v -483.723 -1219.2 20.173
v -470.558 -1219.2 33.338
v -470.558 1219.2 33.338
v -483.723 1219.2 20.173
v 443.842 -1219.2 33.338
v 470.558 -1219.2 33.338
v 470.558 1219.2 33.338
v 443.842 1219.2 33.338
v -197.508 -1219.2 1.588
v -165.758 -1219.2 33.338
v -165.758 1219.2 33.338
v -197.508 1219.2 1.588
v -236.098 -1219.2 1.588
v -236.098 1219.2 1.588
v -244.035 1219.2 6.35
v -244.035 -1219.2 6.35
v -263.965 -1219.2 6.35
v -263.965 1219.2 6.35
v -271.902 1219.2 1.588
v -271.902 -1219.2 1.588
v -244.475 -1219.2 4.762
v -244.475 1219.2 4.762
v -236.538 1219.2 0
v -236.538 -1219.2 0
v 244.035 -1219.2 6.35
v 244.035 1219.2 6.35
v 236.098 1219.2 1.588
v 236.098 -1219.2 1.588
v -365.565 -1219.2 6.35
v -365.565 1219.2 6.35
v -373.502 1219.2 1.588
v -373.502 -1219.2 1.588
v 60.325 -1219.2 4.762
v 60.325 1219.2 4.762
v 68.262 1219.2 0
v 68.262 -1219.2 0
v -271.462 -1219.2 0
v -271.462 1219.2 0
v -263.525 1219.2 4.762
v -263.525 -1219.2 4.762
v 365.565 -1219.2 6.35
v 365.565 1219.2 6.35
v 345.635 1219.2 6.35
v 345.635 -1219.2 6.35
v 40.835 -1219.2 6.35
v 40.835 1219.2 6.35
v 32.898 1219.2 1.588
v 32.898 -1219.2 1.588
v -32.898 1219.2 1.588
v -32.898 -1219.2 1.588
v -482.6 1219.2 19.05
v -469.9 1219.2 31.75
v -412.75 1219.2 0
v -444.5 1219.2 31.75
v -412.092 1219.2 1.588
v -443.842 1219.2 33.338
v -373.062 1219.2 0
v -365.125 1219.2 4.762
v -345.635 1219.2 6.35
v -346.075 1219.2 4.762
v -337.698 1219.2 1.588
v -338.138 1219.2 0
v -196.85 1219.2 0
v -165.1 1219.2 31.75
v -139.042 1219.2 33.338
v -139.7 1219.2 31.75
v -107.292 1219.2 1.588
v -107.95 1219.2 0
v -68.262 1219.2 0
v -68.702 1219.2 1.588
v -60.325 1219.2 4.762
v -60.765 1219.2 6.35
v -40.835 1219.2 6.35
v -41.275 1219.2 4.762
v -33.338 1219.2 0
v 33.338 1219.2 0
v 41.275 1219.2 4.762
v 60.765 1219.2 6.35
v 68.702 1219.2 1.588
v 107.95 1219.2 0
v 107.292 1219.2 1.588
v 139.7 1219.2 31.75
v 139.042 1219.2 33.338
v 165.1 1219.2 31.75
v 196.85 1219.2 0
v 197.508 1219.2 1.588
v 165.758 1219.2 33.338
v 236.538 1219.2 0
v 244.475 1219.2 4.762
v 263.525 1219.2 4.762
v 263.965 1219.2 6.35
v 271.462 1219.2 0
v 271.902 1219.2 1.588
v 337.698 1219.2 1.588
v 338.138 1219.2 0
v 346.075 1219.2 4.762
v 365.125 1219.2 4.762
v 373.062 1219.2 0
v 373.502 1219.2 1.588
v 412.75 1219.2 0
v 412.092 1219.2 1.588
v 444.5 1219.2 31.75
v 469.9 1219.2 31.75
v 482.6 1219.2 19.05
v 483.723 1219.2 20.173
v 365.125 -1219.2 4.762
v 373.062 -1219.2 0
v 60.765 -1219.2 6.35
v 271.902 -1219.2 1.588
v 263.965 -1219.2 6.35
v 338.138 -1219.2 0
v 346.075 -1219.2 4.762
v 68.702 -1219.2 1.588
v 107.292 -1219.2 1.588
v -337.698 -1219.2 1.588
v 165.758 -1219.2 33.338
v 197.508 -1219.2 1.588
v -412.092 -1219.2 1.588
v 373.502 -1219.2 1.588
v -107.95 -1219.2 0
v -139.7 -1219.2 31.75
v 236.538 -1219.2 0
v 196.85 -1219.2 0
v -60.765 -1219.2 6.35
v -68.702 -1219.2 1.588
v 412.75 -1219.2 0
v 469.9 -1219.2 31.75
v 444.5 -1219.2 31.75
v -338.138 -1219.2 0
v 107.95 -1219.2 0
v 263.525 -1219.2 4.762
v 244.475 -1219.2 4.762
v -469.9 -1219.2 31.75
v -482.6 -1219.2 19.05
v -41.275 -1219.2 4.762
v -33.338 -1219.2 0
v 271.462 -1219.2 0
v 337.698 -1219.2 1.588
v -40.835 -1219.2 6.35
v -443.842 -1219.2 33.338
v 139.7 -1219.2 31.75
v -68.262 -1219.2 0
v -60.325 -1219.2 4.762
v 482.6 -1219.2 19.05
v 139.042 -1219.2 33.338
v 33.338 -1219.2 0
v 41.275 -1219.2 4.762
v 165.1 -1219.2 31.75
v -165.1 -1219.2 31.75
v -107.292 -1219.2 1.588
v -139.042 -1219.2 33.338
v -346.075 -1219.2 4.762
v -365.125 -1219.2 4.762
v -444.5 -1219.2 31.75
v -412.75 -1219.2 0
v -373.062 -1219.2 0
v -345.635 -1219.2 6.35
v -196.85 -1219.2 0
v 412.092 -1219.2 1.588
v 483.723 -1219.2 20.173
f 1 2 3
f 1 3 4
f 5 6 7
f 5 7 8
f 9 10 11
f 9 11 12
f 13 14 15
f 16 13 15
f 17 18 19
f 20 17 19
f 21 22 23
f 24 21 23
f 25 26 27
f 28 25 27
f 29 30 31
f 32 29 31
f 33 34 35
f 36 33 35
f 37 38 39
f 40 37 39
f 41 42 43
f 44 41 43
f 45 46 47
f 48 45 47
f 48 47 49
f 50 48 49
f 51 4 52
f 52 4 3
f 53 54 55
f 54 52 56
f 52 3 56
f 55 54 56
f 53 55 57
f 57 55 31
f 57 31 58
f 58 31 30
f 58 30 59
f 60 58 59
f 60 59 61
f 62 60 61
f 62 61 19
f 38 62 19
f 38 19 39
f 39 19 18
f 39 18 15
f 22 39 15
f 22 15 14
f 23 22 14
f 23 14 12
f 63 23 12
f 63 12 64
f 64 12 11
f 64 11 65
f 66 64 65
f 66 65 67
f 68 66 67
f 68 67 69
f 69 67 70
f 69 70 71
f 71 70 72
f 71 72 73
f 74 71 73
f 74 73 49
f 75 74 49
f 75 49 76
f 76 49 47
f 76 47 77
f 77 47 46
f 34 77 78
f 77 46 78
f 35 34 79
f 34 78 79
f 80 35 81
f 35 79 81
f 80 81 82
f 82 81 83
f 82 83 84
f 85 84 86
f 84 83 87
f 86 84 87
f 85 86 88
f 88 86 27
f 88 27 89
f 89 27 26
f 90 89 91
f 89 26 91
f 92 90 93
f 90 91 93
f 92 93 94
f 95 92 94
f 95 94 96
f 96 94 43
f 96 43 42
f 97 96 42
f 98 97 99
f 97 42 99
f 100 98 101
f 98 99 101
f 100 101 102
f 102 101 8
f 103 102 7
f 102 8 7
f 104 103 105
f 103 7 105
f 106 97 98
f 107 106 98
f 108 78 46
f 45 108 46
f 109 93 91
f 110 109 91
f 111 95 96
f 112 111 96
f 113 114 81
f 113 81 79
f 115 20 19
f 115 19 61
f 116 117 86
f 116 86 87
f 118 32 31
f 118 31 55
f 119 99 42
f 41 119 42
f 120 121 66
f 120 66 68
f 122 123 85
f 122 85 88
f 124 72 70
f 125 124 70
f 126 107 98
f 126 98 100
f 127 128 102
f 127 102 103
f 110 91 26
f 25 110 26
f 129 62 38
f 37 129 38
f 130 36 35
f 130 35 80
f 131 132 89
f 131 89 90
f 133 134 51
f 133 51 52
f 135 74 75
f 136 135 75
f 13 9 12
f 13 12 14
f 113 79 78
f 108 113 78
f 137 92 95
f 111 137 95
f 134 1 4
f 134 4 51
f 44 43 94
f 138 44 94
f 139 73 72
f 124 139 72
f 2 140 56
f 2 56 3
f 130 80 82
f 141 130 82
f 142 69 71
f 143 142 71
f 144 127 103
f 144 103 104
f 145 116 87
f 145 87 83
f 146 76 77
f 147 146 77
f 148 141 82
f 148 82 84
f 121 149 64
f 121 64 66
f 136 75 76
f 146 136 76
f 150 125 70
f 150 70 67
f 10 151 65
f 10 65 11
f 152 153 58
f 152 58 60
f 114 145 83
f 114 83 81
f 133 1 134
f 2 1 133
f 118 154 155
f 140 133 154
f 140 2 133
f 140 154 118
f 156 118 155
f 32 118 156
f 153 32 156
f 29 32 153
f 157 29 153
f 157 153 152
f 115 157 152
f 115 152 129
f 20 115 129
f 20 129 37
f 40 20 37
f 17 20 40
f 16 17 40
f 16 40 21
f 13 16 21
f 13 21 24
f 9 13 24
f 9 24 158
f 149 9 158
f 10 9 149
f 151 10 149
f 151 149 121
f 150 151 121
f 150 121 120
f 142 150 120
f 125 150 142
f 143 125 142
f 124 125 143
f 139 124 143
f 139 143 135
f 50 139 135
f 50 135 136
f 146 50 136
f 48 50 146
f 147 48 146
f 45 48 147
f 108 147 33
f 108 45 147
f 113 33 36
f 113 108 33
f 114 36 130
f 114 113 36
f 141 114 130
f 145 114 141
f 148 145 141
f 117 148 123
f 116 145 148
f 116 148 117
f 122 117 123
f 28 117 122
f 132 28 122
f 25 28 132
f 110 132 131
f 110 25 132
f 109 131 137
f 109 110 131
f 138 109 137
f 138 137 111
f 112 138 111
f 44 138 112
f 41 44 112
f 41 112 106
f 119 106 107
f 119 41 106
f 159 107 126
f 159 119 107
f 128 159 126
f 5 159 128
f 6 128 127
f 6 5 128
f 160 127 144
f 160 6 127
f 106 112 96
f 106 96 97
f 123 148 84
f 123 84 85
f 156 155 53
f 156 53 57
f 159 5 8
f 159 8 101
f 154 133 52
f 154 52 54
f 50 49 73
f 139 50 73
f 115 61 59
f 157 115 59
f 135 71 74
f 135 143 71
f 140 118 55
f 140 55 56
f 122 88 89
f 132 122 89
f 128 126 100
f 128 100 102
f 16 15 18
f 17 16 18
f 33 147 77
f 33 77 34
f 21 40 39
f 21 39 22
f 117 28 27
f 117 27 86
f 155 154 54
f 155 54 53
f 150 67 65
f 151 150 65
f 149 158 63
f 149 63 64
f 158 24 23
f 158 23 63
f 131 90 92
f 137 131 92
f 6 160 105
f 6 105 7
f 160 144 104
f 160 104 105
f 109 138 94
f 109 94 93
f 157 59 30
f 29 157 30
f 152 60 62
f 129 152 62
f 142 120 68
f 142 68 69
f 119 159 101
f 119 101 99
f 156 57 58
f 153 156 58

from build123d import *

# Parameters (mm, degrees)
F1_DEPTH = 1219.2


with BuildPart() as f1:
    # F0 (on Front) → F1 (new body, symmetric)
    with BuildSketch(Plane.XZ):
        Polygon((-33.3375, 0), (33.3375, 0), (41.275, 4.7625), (60.325, 4.7625), (68.2625, 0), (107.95, 0), (139.7, 31.75), (165.1, 31.75), (196.85, 0), (236.5375, 0), (244.475, 4.7625), (263.525, 4.7625), (271.4625, 0), (338.1375, 0), (346.075, 4.7625), (365.125, 4.7625), (373.0625, 0), (412.75, 0), (444.5, 31.75), (469.9, 31.75), (482.6, 19.05), (483.722532, 20.172532), (470.557564, 33.3375), (443.842436, 33.3375), (412.092436, 1.5875), (373.502212, 1.5875), (365.564712, 6.35), (345.635288, 6.35), (337.697788, 1.5875), (271.902212, 1.5875), (263.964712, 6.35), (244.035288, 6.35), (236.097788, 1.5875), (197.507564, 1.5875), (165.757564, 33.3375), (139.042436, 33.3375), (107.292436, 1.5875), (68.702212, 1.5875), (60.764712, 6.35), (40.835288, 6.35), (32.897788, 1.5875), (-32.897788, 1.5875), (-40.835288, 6.35), (-60.764712, 6.35), (-68.702212, 1.5875), (-107.292436, 1.5875), (-139.042436, 33.3375), (-165.757564, 33.3375), (-197.507564, 1.5875), (-236.097788, 1.5875), (-244.035288, 6.35), (-263.964712, 6.35), (-271.902212, 1.5875), (-337.697788, 1.5875), (-345.635288, 6.35), (-365.564712, 6.35), (-373.502212, 1.5875), (-412.092436, 1.5875), (-443.842436, 33.3375), (-470.557564, 33.3375), (-483.722532, 20.172532), (-482.6, 19.05), (-469.9, 31.75), (-444.5, 31.75), (-412.75, 0), (-373.0625, 0), (-365.125, 4.7625), (-346.075, 4.7625), (-338.1375, 0), (-271.4625, 0), (-263.525, 4.7625), (-244.475, 4.7625), (-236.5375, 0), (-196.85, 0), (-165.1, 31.75), (-139.7, 31.75), (-107.95, 0), (-68.2625, 0), (-60.325, 4.7625), (-41.275, 4.7625), align=None)
    extrude(amount=F1_DEPTH, both=True)


solid = f1.part
